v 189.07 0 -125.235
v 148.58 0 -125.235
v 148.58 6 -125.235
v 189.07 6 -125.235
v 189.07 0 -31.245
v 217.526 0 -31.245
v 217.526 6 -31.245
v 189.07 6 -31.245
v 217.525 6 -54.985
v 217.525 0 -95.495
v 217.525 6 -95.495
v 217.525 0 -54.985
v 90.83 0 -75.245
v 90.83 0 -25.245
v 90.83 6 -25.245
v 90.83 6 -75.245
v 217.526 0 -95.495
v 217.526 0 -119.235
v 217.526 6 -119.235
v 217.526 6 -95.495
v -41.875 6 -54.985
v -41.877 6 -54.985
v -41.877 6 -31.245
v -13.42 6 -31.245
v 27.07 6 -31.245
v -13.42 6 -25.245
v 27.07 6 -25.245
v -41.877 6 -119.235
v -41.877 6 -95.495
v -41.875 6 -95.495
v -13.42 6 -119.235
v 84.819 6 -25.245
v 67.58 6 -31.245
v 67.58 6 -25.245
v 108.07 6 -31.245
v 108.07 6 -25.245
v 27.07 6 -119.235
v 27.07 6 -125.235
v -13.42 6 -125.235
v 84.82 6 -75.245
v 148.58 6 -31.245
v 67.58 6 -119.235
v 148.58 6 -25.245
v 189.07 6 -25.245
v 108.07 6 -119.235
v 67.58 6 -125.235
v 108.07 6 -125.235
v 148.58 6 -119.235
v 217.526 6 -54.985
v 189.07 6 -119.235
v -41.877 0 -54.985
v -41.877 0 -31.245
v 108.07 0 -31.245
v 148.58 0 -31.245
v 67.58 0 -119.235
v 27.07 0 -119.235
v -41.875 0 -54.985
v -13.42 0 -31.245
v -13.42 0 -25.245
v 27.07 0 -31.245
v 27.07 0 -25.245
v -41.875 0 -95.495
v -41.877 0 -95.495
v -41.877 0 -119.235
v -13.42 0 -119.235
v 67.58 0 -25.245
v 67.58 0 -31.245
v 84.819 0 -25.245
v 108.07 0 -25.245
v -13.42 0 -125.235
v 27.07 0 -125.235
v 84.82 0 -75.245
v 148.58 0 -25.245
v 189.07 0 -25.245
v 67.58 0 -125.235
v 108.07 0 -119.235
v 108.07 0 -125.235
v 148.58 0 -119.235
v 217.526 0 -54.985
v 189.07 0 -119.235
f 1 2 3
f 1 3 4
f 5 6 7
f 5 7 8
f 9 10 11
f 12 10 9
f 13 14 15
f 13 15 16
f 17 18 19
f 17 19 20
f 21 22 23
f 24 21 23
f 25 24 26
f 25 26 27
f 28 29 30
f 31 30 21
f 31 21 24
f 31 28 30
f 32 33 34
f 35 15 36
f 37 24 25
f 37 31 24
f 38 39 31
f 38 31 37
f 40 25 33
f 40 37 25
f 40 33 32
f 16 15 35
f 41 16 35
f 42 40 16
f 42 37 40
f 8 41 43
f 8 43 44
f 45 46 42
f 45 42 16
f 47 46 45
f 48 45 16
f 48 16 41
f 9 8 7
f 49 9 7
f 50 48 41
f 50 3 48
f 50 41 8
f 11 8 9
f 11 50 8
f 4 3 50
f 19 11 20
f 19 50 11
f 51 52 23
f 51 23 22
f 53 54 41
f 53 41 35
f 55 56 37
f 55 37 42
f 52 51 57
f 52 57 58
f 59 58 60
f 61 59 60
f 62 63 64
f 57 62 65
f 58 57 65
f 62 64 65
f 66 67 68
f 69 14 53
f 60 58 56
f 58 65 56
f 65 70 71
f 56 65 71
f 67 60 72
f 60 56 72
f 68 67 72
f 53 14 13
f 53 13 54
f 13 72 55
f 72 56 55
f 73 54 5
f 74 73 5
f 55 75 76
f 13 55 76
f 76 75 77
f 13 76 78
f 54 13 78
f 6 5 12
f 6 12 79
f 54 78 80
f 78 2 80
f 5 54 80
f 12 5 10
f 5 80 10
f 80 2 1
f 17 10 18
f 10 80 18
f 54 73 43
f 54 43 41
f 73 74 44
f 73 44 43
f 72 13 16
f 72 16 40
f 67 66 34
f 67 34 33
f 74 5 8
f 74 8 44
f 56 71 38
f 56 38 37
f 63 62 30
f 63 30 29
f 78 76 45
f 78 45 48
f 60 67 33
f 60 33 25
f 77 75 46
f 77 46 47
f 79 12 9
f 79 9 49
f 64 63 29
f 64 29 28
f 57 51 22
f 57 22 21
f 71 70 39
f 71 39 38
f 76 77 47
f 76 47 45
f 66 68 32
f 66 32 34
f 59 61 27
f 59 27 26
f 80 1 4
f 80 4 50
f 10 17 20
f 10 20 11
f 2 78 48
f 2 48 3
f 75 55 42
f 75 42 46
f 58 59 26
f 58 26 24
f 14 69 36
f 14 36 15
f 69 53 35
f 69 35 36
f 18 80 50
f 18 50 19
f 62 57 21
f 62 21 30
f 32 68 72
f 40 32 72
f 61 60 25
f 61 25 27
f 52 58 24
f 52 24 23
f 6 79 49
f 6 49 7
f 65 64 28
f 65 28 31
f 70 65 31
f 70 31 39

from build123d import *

# Parameters (mm, degrees)
SKETCH1_W                   = 515.597416032
SKETCH1_H                   = 317.102213092
BOSS_EXTRUDE1_DEPTH         = 6
CUT_EXTRUDE_THIN1_START     = -6
CUT_EXTRUDE_THIN1_OUTLINE_W = 515.597416032
CUT_EXTRUDE_THIN1_OUTLINE_H = 317.102213092
CUT_EXTRUDE_THIN1_DEPTH     = 6


# Read off the part's stored shape, not the designer's step: Cut-Extrude-Thin1
with BuildPart() as part:
    # Sketch1 → Boss-Extrude1 (new body)
    with BuildSketch(Plane(origin=(0, 0, 0), x_dir=(1, 0, 0), z_dir=(0, 1, 0))):
        Rectangle(SKETCH1_W, SKETCH1_H)
    extrude(amount=BOSS_EXTRUDE1_DEPTH)

    # Cut-Extrude-Thin1 outline → Cut-Extrude-Thin1 (cut)
    with BuildSketch(Plane(origin=(0, 6, 0), x_dir=(1, 0, 0), z_dir=(0, 1, 0)).offset(CUT_EXTRUDE_THIN1_START)):
        Rectangle(CUT_EXTRUDE_THIN1_OUTLINE_W, CUT_EXTRUDE_THIN1_OUTLINE_H)
        with BuildLine():
            add(Edge.make_bspline(
                [(84.819466733, 25.244885548), (84.821389699, 29.41155314), (84.819617483, 33.578221619), (84.819636894, 37.744889655), (84.819695129, 50.244893831), (84.819695129, 62.744898008), (84.819695129, 75.244902185)],
                knots=[0, 0, 0, 0, 0.012500004, 0.012500004, 0.012500004, 0.050000017, 0.050000017, 0.050000017, 0.050000017], degree=3))
            Line((84.819466733, 25.244885548), (67.579926926, 25.244885548))
            Line((67.579926926, 25.244885548), (67.579926926, 31.244916231))
            Line((67.579926926, 31.244916231), (27.06992581, 31.244916231))
            Line((27.06992581, 31.244916231), (27.06992581, 25.244885548))
            Line((27.06992581, 25.244885548), (-13.420075307, 25.244885548))
            Line((-13.420075307, 25.244885548), (-13.420075307, 31.244916231))
            Line((-13.420075307, 31.244916231), (-41.87677177, 31.244916231))
            Line((-41.87677177, 31.244916231), (-41.87677177, 54.984916885))
            Line((-41.87677177, 54.984916885), (-41.875093181, 54.984916885))
            Line((-41.875093181, 54.984916885), (-41.875093181, 95.494918002))
            Line((-41.875093181, 95.494918002), (-41.87677177, 95.494918002))
            Line((-41.87677177, 95.494918002), (-41.87677177, 119.234918656))
            Line((-41.87677177, 119.234918656), (-13.420075307, 119.234918656))
            Line((-13.420075307, 119.234918656), (-13.420075307, 125.234918822))
            Line((-13.420075307, 125.234918822), (27.06992581, 125.234918822))
            Line((27.06992581, 125.234918822), (27.06992581, 119.234918656))
            Line((27.06992581, 119.234918656), (67.579926926, 119.234918656))
            Line((67.579926926, 119.234918656), (67.579926926, 125.234918822))
            Line((67.579926926, 125.234918822), (108.069928043, 125.234918822))
            Line((108.069928043, 125.234918822), (108.069928043, 119.234918656))
            Line((108.069928043, 119.234918656), (148.579929159, 119.234918656))
            Line((148.579929159, 119.234918656), (148.579929159, 125.234918822))
            Line((148.579929159, 125.234918822), (189.069930275, 125.234918822))
            Line((189.069930275, 125.234918822), (189.069930275, 119.234918656))
            Line((189.069930275, 119.234918656), (217.526162193, 119.234918656))
            Line((217.526162193, 119.234918656), (217.526162193, 95.494918002))
            Line((217.526162193, 95.494918002), (217.524917632, 95.494918002))
            Line((217.524917632, 95.494918002), (217.524917632, 54.984916885))
            Line((217.524917632, 54.984916885), (217.526162193, 54.984916885))
            Line((217.526162193, 54.984916885), (217.526162193, 31.244916231))
            Line((217.526162193, 31.244916231), (189.069930275, 31.244916231))
            Line((189.069930275, 31.244916231), (189.069930275, 25.244885548))
            Line((189.069930275, 25.244885548), (148.579929159, 25.244885548))
            Line((148.579929159, 25.244885548), (148.579929159, 31.244916231))
            Line((148.579929159, 31.244916231), (108.069928043, 31.244916231))
            Line((108.069928043, 31.244916231), (108.069928043, 25.244885548))
            Line((108.069928043, 25.244885548), (90.829695294, 25.244885548))
            Line((90.829695294, 25.244885548), (90.829695294, 75.244902185))
            Line((90.829695294, 75.244902185), (84.819695129, 75.244902185))
        make_face(mode=Mode.SUBTRACT)
    extrude(amount=CUT_EXTRUDE_THIN1_DEPTH, mode=Mode.SUBTRACT)


solid = part.part
